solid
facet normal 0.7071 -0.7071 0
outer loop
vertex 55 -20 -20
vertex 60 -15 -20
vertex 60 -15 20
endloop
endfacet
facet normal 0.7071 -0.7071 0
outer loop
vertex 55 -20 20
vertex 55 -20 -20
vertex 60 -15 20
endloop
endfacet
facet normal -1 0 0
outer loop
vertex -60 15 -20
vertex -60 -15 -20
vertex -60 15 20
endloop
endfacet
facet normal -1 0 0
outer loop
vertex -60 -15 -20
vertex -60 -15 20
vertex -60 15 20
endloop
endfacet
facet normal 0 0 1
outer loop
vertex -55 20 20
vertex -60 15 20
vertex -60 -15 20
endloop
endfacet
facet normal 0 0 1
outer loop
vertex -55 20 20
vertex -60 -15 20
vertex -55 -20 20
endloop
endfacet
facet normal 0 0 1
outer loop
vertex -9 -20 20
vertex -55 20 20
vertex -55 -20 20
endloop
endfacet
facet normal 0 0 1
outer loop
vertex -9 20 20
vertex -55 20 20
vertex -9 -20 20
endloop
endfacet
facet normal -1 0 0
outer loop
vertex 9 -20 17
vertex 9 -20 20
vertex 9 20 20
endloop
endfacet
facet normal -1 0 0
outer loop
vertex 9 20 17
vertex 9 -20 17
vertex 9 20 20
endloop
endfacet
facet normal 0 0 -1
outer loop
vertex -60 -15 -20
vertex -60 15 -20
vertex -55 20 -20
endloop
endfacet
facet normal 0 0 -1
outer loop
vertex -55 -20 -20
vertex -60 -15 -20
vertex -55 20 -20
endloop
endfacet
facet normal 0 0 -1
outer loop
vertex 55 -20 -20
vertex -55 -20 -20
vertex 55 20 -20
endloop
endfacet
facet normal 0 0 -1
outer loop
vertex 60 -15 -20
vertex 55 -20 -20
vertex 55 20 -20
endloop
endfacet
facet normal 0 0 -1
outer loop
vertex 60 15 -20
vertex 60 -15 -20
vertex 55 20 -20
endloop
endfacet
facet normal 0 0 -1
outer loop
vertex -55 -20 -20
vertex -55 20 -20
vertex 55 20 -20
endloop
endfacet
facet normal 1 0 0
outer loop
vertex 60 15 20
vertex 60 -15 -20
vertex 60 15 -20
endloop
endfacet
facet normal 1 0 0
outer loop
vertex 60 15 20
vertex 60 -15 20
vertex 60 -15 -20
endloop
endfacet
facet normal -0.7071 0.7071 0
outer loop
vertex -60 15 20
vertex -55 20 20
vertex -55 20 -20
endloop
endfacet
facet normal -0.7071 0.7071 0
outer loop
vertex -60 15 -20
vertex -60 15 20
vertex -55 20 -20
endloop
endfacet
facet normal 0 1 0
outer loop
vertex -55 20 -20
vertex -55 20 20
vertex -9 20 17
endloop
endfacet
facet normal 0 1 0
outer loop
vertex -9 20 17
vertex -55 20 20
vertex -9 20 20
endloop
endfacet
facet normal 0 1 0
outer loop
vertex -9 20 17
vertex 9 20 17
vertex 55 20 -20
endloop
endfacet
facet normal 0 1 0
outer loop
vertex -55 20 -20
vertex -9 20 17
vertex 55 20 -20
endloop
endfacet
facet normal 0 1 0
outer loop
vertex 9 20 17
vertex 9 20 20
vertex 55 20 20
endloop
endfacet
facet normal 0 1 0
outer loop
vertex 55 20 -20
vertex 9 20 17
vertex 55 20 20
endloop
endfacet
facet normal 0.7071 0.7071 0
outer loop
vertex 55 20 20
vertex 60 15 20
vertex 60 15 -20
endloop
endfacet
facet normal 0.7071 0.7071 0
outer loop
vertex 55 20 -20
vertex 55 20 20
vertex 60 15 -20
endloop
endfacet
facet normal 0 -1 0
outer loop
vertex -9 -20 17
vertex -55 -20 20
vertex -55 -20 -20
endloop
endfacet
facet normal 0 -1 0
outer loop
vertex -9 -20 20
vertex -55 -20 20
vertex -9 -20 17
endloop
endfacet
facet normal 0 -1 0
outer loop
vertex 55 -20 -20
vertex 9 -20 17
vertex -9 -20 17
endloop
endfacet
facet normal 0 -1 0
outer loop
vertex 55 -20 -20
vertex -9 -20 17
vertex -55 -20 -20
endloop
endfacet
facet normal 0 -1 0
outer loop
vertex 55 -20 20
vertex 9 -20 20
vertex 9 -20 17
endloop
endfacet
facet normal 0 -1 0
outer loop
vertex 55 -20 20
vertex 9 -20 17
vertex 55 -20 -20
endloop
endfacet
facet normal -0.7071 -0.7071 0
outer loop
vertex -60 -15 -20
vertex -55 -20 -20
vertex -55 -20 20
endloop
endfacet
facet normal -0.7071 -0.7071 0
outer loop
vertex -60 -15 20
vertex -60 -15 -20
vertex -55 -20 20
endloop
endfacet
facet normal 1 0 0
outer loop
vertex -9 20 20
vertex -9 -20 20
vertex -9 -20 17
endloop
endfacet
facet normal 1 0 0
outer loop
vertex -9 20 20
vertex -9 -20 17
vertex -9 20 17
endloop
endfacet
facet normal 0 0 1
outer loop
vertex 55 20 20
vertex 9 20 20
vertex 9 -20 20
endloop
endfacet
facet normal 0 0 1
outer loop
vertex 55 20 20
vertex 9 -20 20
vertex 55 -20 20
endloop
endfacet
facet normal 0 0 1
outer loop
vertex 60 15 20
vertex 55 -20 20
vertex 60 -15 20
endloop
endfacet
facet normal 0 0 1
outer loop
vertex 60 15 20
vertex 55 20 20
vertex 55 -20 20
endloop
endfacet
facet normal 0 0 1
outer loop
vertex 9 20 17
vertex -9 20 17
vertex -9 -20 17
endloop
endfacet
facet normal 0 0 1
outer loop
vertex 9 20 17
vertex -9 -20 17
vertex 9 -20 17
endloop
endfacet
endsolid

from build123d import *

# Parameters (mm, degrees)
SKETCH_1_W          = 120
SKETCH_1_H          = 40
EXTRUDE_1_DEPTH     = 20
SKETCH_2_W          = 18
SKETCH_2_H          = 40
CUT_EXTRUDE_1_DEPTH = 3
CHAMFER_1_SIZE      = 5


with BuildPart() as part:
    # 草图1 → 凸台-拉伸1 (new, symmetric)
    with BuildSketch(Plane.XY):
        Rectangle(SKETCH_1_W, SKETCH_1_H)
    extrude(amount=EXTRUDE_1_DEPTH, both=True)

    # 草图2 → 切除-拉伸1 (cut)
    with BuildSketch(Plane.XY.offset(20)):
        Rectangle(SKETCH_2_W, SKETCH_2_H)
    extrude(amount=-CUT_EXTRUDE_1_DEPTH, mode=Mode.SUBTRACT)

    # 倒角1
    chamfer_1_edges = [part.edges().sort_by_distance(p)[0] for p in [
        (60, -20, 0),
        (-60, -20, 0),
        (-60, 20, 0),
        (60, 20, 0),
    ]]
    chamfer(chamfer_1_edges, length=CHAMFER_1_SIZE)


solid = part.part
